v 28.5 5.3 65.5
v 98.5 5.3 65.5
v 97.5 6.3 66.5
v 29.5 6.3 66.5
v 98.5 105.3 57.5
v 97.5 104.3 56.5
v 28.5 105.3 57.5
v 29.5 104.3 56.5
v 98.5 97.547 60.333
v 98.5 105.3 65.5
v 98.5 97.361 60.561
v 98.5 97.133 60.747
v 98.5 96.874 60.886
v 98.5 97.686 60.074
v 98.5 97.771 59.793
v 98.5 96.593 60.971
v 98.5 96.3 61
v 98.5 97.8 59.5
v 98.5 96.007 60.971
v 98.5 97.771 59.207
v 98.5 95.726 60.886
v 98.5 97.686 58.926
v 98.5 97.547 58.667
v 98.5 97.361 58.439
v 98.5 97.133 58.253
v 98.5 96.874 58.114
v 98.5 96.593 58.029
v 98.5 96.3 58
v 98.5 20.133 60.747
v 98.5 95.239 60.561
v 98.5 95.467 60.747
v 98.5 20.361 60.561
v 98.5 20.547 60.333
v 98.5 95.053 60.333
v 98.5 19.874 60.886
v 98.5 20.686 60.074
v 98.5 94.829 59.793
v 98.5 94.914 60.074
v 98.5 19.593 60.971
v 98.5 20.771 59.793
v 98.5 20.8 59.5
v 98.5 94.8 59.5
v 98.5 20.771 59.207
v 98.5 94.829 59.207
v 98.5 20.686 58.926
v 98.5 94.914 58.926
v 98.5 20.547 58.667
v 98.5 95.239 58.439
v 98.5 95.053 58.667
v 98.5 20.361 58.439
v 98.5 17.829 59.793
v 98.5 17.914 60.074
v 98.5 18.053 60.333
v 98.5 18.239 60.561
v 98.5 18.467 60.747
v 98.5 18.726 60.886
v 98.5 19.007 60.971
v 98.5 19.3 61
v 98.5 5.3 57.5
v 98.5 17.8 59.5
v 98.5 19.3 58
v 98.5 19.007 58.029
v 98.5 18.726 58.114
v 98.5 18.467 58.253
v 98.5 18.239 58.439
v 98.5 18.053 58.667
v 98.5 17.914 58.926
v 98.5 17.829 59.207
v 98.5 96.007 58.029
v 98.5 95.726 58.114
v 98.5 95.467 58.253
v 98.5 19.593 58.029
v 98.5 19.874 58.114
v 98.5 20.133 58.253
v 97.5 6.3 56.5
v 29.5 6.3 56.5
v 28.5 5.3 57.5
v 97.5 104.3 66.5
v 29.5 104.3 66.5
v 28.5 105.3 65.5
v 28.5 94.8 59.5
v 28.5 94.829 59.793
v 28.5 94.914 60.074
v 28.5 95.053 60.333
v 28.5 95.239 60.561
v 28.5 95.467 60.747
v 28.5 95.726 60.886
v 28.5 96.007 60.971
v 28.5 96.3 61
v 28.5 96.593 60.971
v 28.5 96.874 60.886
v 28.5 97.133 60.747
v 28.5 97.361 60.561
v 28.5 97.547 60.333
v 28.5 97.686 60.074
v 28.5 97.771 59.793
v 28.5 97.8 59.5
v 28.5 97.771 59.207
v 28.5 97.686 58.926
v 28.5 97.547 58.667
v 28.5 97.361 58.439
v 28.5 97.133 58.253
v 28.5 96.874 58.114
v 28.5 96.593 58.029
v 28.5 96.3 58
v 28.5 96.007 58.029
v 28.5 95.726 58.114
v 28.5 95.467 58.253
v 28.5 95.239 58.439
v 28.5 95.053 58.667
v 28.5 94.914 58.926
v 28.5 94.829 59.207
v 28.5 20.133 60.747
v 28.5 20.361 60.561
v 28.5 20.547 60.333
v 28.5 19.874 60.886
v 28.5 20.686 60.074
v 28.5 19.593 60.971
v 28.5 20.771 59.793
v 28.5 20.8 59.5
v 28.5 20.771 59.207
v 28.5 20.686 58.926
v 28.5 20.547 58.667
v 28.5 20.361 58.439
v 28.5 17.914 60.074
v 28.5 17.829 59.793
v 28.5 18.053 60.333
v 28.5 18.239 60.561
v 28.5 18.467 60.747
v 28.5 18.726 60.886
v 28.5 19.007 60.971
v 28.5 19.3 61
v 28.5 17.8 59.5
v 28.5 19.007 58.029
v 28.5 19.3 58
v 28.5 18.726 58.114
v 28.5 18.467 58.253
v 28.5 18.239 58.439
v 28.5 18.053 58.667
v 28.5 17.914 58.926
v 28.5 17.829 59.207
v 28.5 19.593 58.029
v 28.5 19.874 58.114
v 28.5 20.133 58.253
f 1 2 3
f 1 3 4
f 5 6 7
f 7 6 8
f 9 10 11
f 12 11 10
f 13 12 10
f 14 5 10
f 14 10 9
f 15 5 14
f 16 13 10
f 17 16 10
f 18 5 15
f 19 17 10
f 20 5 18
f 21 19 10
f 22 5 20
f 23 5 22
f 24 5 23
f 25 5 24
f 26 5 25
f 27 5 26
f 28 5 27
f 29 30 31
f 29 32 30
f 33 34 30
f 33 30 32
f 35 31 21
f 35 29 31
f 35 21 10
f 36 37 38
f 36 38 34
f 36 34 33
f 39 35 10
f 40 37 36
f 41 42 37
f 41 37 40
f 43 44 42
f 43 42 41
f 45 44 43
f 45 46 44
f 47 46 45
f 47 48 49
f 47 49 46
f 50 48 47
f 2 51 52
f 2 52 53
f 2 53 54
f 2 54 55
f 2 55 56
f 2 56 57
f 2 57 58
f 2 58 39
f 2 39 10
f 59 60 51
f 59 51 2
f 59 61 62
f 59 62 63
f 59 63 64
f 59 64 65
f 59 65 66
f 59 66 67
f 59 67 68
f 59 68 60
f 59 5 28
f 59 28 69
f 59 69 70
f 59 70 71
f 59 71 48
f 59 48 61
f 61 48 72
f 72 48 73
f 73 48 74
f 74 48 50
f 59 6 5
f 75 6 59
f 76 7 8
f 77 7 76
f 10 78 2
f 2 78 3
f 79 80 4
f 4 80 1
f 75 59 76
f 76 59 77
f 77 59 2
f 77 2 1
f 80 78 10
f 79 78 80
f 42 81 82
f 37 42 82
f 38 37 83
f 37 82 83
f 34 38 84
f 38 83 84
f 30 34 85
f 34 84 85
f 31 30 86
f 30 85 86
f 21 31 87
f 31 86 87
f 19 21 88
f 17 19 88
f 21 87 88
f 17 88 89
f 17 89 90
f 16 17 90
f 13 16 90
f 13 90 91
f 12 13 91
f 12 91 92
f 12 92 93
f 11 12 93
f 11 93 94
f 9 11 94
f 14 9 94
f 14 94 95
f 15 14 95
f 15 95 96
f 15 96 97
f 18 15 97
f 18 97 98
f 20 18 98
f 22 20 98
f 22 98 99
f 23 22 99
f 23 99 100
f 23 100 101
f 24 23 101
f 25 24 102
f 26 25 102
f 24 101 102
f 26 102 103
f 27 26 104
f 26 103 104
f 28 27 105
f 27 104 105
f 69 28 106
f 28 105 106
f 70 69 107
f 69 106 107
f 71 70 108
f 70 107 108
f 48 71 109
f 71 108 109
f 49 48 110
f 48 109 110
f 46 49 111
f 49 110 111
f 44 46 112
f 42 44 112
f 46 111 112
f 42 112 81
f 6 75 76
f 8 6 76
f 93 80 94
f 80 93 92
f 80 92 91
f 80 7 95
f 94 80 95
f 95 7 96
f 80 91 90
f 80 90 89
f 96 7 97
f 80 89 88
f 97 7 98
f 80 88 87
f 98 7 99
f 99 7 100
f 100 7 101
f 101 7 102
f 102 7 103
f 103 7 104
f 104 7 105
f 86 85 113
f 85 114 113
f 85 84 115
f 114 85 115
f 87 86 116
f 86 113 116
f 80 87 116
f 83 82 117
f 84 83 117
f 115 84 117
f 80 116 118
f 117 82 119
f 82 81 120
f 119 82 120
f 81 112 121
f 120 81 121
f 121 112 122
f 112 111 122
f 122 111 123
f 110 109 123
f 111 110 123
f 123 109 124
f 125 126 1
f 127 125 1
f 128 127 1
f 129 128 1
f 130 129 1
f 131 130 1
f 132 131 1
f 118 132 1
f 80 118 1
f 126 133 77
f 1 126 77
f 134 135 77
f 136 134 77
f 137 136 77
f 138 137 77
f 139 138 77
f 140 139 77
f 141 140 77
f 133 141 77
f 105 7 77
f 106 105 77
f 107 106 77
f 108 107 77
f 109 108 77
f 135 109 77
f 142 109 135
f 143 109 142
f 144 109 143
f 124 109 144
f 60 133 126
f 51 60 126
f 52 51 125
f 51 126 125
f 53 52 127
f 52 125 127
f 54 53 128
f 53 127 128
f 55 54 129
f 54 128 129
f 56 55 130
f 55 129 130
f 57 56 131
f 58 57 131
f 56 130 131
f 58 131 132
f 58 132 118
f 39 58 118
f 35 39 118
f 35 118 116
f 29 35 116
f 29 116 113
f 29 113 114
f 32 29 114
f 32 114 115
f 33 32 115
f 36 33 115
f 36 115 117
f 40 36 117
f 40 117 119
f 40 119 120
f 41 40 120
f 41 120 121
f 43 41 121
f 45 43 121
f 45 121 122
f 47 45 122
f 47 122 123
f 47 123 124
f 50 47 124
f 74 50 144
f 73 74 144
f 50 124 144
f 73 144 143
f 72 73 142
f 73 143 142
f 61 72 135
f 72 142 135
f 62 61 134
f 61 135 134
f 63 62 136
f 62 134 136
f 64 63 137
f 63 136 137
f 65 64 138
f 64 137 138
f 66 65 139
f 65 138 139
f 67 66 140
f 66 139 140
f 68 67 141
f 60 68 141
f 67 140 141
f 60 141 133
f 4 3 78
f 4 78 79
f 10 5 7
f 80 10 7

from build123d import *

# Parameters (mm, degrees)
SKETCH070_W             = 70
SKETCH070_H             = 100
PAD024_DEPTH            = 10
SKETCH071_R             = 1.5
POCKET046_DEPTH         = 70.001
CHAMFER006_SIZE         = 1
BODY020_PLACEMENT_ANGLE = 180


with BuildPart() as part:
    # Sketch070 → Pad024 (new body)
    with BuildSketch(Plane.XY):
        Rectangle(SKETCH070_W, SKETCH070_H)
    extrude(amount=PAD024_DEPTH)

    # Sketch071 (on Face3 of Pad024) → Pocket046 (cut, through all)
    with BuildSketch(Plane.YZ.offset(35)):
        with Locations((36, 3)):
            Circle(SKETCH071_R)
        with Locations((-41, 3)):
            Circle(SKETCH071_R)
    extrude(amount=-POCKET046_DEPTH, mode=Mode.SUBTRACT)

    # Chamfer006
    chamfer006_edges = [part.edges().sort_by_distance(p)[0] for p in [
        (-35, 0, 0),
        (0, -50, 0),
        (35, 0, 0),
        (0, 50, 0),
        (-35, 0, 10),
        (0, -50, 10),
        (35, 0, 10),
        (0, 50, 10),
    ]]
    chamfer(chamfer006_edges, length=CHAMFER006_SIZE)


with BuildPart() as part_1:
    # Body020 placement: moved
    add(part.part.moved(Location((63.5, 55.3, 56.5))).rotate(Axis((63.5, 55.3, 56.5), (0, 0, 1)), BODY020_PLACEMENT_ANGLE))


solid = part_1.part
